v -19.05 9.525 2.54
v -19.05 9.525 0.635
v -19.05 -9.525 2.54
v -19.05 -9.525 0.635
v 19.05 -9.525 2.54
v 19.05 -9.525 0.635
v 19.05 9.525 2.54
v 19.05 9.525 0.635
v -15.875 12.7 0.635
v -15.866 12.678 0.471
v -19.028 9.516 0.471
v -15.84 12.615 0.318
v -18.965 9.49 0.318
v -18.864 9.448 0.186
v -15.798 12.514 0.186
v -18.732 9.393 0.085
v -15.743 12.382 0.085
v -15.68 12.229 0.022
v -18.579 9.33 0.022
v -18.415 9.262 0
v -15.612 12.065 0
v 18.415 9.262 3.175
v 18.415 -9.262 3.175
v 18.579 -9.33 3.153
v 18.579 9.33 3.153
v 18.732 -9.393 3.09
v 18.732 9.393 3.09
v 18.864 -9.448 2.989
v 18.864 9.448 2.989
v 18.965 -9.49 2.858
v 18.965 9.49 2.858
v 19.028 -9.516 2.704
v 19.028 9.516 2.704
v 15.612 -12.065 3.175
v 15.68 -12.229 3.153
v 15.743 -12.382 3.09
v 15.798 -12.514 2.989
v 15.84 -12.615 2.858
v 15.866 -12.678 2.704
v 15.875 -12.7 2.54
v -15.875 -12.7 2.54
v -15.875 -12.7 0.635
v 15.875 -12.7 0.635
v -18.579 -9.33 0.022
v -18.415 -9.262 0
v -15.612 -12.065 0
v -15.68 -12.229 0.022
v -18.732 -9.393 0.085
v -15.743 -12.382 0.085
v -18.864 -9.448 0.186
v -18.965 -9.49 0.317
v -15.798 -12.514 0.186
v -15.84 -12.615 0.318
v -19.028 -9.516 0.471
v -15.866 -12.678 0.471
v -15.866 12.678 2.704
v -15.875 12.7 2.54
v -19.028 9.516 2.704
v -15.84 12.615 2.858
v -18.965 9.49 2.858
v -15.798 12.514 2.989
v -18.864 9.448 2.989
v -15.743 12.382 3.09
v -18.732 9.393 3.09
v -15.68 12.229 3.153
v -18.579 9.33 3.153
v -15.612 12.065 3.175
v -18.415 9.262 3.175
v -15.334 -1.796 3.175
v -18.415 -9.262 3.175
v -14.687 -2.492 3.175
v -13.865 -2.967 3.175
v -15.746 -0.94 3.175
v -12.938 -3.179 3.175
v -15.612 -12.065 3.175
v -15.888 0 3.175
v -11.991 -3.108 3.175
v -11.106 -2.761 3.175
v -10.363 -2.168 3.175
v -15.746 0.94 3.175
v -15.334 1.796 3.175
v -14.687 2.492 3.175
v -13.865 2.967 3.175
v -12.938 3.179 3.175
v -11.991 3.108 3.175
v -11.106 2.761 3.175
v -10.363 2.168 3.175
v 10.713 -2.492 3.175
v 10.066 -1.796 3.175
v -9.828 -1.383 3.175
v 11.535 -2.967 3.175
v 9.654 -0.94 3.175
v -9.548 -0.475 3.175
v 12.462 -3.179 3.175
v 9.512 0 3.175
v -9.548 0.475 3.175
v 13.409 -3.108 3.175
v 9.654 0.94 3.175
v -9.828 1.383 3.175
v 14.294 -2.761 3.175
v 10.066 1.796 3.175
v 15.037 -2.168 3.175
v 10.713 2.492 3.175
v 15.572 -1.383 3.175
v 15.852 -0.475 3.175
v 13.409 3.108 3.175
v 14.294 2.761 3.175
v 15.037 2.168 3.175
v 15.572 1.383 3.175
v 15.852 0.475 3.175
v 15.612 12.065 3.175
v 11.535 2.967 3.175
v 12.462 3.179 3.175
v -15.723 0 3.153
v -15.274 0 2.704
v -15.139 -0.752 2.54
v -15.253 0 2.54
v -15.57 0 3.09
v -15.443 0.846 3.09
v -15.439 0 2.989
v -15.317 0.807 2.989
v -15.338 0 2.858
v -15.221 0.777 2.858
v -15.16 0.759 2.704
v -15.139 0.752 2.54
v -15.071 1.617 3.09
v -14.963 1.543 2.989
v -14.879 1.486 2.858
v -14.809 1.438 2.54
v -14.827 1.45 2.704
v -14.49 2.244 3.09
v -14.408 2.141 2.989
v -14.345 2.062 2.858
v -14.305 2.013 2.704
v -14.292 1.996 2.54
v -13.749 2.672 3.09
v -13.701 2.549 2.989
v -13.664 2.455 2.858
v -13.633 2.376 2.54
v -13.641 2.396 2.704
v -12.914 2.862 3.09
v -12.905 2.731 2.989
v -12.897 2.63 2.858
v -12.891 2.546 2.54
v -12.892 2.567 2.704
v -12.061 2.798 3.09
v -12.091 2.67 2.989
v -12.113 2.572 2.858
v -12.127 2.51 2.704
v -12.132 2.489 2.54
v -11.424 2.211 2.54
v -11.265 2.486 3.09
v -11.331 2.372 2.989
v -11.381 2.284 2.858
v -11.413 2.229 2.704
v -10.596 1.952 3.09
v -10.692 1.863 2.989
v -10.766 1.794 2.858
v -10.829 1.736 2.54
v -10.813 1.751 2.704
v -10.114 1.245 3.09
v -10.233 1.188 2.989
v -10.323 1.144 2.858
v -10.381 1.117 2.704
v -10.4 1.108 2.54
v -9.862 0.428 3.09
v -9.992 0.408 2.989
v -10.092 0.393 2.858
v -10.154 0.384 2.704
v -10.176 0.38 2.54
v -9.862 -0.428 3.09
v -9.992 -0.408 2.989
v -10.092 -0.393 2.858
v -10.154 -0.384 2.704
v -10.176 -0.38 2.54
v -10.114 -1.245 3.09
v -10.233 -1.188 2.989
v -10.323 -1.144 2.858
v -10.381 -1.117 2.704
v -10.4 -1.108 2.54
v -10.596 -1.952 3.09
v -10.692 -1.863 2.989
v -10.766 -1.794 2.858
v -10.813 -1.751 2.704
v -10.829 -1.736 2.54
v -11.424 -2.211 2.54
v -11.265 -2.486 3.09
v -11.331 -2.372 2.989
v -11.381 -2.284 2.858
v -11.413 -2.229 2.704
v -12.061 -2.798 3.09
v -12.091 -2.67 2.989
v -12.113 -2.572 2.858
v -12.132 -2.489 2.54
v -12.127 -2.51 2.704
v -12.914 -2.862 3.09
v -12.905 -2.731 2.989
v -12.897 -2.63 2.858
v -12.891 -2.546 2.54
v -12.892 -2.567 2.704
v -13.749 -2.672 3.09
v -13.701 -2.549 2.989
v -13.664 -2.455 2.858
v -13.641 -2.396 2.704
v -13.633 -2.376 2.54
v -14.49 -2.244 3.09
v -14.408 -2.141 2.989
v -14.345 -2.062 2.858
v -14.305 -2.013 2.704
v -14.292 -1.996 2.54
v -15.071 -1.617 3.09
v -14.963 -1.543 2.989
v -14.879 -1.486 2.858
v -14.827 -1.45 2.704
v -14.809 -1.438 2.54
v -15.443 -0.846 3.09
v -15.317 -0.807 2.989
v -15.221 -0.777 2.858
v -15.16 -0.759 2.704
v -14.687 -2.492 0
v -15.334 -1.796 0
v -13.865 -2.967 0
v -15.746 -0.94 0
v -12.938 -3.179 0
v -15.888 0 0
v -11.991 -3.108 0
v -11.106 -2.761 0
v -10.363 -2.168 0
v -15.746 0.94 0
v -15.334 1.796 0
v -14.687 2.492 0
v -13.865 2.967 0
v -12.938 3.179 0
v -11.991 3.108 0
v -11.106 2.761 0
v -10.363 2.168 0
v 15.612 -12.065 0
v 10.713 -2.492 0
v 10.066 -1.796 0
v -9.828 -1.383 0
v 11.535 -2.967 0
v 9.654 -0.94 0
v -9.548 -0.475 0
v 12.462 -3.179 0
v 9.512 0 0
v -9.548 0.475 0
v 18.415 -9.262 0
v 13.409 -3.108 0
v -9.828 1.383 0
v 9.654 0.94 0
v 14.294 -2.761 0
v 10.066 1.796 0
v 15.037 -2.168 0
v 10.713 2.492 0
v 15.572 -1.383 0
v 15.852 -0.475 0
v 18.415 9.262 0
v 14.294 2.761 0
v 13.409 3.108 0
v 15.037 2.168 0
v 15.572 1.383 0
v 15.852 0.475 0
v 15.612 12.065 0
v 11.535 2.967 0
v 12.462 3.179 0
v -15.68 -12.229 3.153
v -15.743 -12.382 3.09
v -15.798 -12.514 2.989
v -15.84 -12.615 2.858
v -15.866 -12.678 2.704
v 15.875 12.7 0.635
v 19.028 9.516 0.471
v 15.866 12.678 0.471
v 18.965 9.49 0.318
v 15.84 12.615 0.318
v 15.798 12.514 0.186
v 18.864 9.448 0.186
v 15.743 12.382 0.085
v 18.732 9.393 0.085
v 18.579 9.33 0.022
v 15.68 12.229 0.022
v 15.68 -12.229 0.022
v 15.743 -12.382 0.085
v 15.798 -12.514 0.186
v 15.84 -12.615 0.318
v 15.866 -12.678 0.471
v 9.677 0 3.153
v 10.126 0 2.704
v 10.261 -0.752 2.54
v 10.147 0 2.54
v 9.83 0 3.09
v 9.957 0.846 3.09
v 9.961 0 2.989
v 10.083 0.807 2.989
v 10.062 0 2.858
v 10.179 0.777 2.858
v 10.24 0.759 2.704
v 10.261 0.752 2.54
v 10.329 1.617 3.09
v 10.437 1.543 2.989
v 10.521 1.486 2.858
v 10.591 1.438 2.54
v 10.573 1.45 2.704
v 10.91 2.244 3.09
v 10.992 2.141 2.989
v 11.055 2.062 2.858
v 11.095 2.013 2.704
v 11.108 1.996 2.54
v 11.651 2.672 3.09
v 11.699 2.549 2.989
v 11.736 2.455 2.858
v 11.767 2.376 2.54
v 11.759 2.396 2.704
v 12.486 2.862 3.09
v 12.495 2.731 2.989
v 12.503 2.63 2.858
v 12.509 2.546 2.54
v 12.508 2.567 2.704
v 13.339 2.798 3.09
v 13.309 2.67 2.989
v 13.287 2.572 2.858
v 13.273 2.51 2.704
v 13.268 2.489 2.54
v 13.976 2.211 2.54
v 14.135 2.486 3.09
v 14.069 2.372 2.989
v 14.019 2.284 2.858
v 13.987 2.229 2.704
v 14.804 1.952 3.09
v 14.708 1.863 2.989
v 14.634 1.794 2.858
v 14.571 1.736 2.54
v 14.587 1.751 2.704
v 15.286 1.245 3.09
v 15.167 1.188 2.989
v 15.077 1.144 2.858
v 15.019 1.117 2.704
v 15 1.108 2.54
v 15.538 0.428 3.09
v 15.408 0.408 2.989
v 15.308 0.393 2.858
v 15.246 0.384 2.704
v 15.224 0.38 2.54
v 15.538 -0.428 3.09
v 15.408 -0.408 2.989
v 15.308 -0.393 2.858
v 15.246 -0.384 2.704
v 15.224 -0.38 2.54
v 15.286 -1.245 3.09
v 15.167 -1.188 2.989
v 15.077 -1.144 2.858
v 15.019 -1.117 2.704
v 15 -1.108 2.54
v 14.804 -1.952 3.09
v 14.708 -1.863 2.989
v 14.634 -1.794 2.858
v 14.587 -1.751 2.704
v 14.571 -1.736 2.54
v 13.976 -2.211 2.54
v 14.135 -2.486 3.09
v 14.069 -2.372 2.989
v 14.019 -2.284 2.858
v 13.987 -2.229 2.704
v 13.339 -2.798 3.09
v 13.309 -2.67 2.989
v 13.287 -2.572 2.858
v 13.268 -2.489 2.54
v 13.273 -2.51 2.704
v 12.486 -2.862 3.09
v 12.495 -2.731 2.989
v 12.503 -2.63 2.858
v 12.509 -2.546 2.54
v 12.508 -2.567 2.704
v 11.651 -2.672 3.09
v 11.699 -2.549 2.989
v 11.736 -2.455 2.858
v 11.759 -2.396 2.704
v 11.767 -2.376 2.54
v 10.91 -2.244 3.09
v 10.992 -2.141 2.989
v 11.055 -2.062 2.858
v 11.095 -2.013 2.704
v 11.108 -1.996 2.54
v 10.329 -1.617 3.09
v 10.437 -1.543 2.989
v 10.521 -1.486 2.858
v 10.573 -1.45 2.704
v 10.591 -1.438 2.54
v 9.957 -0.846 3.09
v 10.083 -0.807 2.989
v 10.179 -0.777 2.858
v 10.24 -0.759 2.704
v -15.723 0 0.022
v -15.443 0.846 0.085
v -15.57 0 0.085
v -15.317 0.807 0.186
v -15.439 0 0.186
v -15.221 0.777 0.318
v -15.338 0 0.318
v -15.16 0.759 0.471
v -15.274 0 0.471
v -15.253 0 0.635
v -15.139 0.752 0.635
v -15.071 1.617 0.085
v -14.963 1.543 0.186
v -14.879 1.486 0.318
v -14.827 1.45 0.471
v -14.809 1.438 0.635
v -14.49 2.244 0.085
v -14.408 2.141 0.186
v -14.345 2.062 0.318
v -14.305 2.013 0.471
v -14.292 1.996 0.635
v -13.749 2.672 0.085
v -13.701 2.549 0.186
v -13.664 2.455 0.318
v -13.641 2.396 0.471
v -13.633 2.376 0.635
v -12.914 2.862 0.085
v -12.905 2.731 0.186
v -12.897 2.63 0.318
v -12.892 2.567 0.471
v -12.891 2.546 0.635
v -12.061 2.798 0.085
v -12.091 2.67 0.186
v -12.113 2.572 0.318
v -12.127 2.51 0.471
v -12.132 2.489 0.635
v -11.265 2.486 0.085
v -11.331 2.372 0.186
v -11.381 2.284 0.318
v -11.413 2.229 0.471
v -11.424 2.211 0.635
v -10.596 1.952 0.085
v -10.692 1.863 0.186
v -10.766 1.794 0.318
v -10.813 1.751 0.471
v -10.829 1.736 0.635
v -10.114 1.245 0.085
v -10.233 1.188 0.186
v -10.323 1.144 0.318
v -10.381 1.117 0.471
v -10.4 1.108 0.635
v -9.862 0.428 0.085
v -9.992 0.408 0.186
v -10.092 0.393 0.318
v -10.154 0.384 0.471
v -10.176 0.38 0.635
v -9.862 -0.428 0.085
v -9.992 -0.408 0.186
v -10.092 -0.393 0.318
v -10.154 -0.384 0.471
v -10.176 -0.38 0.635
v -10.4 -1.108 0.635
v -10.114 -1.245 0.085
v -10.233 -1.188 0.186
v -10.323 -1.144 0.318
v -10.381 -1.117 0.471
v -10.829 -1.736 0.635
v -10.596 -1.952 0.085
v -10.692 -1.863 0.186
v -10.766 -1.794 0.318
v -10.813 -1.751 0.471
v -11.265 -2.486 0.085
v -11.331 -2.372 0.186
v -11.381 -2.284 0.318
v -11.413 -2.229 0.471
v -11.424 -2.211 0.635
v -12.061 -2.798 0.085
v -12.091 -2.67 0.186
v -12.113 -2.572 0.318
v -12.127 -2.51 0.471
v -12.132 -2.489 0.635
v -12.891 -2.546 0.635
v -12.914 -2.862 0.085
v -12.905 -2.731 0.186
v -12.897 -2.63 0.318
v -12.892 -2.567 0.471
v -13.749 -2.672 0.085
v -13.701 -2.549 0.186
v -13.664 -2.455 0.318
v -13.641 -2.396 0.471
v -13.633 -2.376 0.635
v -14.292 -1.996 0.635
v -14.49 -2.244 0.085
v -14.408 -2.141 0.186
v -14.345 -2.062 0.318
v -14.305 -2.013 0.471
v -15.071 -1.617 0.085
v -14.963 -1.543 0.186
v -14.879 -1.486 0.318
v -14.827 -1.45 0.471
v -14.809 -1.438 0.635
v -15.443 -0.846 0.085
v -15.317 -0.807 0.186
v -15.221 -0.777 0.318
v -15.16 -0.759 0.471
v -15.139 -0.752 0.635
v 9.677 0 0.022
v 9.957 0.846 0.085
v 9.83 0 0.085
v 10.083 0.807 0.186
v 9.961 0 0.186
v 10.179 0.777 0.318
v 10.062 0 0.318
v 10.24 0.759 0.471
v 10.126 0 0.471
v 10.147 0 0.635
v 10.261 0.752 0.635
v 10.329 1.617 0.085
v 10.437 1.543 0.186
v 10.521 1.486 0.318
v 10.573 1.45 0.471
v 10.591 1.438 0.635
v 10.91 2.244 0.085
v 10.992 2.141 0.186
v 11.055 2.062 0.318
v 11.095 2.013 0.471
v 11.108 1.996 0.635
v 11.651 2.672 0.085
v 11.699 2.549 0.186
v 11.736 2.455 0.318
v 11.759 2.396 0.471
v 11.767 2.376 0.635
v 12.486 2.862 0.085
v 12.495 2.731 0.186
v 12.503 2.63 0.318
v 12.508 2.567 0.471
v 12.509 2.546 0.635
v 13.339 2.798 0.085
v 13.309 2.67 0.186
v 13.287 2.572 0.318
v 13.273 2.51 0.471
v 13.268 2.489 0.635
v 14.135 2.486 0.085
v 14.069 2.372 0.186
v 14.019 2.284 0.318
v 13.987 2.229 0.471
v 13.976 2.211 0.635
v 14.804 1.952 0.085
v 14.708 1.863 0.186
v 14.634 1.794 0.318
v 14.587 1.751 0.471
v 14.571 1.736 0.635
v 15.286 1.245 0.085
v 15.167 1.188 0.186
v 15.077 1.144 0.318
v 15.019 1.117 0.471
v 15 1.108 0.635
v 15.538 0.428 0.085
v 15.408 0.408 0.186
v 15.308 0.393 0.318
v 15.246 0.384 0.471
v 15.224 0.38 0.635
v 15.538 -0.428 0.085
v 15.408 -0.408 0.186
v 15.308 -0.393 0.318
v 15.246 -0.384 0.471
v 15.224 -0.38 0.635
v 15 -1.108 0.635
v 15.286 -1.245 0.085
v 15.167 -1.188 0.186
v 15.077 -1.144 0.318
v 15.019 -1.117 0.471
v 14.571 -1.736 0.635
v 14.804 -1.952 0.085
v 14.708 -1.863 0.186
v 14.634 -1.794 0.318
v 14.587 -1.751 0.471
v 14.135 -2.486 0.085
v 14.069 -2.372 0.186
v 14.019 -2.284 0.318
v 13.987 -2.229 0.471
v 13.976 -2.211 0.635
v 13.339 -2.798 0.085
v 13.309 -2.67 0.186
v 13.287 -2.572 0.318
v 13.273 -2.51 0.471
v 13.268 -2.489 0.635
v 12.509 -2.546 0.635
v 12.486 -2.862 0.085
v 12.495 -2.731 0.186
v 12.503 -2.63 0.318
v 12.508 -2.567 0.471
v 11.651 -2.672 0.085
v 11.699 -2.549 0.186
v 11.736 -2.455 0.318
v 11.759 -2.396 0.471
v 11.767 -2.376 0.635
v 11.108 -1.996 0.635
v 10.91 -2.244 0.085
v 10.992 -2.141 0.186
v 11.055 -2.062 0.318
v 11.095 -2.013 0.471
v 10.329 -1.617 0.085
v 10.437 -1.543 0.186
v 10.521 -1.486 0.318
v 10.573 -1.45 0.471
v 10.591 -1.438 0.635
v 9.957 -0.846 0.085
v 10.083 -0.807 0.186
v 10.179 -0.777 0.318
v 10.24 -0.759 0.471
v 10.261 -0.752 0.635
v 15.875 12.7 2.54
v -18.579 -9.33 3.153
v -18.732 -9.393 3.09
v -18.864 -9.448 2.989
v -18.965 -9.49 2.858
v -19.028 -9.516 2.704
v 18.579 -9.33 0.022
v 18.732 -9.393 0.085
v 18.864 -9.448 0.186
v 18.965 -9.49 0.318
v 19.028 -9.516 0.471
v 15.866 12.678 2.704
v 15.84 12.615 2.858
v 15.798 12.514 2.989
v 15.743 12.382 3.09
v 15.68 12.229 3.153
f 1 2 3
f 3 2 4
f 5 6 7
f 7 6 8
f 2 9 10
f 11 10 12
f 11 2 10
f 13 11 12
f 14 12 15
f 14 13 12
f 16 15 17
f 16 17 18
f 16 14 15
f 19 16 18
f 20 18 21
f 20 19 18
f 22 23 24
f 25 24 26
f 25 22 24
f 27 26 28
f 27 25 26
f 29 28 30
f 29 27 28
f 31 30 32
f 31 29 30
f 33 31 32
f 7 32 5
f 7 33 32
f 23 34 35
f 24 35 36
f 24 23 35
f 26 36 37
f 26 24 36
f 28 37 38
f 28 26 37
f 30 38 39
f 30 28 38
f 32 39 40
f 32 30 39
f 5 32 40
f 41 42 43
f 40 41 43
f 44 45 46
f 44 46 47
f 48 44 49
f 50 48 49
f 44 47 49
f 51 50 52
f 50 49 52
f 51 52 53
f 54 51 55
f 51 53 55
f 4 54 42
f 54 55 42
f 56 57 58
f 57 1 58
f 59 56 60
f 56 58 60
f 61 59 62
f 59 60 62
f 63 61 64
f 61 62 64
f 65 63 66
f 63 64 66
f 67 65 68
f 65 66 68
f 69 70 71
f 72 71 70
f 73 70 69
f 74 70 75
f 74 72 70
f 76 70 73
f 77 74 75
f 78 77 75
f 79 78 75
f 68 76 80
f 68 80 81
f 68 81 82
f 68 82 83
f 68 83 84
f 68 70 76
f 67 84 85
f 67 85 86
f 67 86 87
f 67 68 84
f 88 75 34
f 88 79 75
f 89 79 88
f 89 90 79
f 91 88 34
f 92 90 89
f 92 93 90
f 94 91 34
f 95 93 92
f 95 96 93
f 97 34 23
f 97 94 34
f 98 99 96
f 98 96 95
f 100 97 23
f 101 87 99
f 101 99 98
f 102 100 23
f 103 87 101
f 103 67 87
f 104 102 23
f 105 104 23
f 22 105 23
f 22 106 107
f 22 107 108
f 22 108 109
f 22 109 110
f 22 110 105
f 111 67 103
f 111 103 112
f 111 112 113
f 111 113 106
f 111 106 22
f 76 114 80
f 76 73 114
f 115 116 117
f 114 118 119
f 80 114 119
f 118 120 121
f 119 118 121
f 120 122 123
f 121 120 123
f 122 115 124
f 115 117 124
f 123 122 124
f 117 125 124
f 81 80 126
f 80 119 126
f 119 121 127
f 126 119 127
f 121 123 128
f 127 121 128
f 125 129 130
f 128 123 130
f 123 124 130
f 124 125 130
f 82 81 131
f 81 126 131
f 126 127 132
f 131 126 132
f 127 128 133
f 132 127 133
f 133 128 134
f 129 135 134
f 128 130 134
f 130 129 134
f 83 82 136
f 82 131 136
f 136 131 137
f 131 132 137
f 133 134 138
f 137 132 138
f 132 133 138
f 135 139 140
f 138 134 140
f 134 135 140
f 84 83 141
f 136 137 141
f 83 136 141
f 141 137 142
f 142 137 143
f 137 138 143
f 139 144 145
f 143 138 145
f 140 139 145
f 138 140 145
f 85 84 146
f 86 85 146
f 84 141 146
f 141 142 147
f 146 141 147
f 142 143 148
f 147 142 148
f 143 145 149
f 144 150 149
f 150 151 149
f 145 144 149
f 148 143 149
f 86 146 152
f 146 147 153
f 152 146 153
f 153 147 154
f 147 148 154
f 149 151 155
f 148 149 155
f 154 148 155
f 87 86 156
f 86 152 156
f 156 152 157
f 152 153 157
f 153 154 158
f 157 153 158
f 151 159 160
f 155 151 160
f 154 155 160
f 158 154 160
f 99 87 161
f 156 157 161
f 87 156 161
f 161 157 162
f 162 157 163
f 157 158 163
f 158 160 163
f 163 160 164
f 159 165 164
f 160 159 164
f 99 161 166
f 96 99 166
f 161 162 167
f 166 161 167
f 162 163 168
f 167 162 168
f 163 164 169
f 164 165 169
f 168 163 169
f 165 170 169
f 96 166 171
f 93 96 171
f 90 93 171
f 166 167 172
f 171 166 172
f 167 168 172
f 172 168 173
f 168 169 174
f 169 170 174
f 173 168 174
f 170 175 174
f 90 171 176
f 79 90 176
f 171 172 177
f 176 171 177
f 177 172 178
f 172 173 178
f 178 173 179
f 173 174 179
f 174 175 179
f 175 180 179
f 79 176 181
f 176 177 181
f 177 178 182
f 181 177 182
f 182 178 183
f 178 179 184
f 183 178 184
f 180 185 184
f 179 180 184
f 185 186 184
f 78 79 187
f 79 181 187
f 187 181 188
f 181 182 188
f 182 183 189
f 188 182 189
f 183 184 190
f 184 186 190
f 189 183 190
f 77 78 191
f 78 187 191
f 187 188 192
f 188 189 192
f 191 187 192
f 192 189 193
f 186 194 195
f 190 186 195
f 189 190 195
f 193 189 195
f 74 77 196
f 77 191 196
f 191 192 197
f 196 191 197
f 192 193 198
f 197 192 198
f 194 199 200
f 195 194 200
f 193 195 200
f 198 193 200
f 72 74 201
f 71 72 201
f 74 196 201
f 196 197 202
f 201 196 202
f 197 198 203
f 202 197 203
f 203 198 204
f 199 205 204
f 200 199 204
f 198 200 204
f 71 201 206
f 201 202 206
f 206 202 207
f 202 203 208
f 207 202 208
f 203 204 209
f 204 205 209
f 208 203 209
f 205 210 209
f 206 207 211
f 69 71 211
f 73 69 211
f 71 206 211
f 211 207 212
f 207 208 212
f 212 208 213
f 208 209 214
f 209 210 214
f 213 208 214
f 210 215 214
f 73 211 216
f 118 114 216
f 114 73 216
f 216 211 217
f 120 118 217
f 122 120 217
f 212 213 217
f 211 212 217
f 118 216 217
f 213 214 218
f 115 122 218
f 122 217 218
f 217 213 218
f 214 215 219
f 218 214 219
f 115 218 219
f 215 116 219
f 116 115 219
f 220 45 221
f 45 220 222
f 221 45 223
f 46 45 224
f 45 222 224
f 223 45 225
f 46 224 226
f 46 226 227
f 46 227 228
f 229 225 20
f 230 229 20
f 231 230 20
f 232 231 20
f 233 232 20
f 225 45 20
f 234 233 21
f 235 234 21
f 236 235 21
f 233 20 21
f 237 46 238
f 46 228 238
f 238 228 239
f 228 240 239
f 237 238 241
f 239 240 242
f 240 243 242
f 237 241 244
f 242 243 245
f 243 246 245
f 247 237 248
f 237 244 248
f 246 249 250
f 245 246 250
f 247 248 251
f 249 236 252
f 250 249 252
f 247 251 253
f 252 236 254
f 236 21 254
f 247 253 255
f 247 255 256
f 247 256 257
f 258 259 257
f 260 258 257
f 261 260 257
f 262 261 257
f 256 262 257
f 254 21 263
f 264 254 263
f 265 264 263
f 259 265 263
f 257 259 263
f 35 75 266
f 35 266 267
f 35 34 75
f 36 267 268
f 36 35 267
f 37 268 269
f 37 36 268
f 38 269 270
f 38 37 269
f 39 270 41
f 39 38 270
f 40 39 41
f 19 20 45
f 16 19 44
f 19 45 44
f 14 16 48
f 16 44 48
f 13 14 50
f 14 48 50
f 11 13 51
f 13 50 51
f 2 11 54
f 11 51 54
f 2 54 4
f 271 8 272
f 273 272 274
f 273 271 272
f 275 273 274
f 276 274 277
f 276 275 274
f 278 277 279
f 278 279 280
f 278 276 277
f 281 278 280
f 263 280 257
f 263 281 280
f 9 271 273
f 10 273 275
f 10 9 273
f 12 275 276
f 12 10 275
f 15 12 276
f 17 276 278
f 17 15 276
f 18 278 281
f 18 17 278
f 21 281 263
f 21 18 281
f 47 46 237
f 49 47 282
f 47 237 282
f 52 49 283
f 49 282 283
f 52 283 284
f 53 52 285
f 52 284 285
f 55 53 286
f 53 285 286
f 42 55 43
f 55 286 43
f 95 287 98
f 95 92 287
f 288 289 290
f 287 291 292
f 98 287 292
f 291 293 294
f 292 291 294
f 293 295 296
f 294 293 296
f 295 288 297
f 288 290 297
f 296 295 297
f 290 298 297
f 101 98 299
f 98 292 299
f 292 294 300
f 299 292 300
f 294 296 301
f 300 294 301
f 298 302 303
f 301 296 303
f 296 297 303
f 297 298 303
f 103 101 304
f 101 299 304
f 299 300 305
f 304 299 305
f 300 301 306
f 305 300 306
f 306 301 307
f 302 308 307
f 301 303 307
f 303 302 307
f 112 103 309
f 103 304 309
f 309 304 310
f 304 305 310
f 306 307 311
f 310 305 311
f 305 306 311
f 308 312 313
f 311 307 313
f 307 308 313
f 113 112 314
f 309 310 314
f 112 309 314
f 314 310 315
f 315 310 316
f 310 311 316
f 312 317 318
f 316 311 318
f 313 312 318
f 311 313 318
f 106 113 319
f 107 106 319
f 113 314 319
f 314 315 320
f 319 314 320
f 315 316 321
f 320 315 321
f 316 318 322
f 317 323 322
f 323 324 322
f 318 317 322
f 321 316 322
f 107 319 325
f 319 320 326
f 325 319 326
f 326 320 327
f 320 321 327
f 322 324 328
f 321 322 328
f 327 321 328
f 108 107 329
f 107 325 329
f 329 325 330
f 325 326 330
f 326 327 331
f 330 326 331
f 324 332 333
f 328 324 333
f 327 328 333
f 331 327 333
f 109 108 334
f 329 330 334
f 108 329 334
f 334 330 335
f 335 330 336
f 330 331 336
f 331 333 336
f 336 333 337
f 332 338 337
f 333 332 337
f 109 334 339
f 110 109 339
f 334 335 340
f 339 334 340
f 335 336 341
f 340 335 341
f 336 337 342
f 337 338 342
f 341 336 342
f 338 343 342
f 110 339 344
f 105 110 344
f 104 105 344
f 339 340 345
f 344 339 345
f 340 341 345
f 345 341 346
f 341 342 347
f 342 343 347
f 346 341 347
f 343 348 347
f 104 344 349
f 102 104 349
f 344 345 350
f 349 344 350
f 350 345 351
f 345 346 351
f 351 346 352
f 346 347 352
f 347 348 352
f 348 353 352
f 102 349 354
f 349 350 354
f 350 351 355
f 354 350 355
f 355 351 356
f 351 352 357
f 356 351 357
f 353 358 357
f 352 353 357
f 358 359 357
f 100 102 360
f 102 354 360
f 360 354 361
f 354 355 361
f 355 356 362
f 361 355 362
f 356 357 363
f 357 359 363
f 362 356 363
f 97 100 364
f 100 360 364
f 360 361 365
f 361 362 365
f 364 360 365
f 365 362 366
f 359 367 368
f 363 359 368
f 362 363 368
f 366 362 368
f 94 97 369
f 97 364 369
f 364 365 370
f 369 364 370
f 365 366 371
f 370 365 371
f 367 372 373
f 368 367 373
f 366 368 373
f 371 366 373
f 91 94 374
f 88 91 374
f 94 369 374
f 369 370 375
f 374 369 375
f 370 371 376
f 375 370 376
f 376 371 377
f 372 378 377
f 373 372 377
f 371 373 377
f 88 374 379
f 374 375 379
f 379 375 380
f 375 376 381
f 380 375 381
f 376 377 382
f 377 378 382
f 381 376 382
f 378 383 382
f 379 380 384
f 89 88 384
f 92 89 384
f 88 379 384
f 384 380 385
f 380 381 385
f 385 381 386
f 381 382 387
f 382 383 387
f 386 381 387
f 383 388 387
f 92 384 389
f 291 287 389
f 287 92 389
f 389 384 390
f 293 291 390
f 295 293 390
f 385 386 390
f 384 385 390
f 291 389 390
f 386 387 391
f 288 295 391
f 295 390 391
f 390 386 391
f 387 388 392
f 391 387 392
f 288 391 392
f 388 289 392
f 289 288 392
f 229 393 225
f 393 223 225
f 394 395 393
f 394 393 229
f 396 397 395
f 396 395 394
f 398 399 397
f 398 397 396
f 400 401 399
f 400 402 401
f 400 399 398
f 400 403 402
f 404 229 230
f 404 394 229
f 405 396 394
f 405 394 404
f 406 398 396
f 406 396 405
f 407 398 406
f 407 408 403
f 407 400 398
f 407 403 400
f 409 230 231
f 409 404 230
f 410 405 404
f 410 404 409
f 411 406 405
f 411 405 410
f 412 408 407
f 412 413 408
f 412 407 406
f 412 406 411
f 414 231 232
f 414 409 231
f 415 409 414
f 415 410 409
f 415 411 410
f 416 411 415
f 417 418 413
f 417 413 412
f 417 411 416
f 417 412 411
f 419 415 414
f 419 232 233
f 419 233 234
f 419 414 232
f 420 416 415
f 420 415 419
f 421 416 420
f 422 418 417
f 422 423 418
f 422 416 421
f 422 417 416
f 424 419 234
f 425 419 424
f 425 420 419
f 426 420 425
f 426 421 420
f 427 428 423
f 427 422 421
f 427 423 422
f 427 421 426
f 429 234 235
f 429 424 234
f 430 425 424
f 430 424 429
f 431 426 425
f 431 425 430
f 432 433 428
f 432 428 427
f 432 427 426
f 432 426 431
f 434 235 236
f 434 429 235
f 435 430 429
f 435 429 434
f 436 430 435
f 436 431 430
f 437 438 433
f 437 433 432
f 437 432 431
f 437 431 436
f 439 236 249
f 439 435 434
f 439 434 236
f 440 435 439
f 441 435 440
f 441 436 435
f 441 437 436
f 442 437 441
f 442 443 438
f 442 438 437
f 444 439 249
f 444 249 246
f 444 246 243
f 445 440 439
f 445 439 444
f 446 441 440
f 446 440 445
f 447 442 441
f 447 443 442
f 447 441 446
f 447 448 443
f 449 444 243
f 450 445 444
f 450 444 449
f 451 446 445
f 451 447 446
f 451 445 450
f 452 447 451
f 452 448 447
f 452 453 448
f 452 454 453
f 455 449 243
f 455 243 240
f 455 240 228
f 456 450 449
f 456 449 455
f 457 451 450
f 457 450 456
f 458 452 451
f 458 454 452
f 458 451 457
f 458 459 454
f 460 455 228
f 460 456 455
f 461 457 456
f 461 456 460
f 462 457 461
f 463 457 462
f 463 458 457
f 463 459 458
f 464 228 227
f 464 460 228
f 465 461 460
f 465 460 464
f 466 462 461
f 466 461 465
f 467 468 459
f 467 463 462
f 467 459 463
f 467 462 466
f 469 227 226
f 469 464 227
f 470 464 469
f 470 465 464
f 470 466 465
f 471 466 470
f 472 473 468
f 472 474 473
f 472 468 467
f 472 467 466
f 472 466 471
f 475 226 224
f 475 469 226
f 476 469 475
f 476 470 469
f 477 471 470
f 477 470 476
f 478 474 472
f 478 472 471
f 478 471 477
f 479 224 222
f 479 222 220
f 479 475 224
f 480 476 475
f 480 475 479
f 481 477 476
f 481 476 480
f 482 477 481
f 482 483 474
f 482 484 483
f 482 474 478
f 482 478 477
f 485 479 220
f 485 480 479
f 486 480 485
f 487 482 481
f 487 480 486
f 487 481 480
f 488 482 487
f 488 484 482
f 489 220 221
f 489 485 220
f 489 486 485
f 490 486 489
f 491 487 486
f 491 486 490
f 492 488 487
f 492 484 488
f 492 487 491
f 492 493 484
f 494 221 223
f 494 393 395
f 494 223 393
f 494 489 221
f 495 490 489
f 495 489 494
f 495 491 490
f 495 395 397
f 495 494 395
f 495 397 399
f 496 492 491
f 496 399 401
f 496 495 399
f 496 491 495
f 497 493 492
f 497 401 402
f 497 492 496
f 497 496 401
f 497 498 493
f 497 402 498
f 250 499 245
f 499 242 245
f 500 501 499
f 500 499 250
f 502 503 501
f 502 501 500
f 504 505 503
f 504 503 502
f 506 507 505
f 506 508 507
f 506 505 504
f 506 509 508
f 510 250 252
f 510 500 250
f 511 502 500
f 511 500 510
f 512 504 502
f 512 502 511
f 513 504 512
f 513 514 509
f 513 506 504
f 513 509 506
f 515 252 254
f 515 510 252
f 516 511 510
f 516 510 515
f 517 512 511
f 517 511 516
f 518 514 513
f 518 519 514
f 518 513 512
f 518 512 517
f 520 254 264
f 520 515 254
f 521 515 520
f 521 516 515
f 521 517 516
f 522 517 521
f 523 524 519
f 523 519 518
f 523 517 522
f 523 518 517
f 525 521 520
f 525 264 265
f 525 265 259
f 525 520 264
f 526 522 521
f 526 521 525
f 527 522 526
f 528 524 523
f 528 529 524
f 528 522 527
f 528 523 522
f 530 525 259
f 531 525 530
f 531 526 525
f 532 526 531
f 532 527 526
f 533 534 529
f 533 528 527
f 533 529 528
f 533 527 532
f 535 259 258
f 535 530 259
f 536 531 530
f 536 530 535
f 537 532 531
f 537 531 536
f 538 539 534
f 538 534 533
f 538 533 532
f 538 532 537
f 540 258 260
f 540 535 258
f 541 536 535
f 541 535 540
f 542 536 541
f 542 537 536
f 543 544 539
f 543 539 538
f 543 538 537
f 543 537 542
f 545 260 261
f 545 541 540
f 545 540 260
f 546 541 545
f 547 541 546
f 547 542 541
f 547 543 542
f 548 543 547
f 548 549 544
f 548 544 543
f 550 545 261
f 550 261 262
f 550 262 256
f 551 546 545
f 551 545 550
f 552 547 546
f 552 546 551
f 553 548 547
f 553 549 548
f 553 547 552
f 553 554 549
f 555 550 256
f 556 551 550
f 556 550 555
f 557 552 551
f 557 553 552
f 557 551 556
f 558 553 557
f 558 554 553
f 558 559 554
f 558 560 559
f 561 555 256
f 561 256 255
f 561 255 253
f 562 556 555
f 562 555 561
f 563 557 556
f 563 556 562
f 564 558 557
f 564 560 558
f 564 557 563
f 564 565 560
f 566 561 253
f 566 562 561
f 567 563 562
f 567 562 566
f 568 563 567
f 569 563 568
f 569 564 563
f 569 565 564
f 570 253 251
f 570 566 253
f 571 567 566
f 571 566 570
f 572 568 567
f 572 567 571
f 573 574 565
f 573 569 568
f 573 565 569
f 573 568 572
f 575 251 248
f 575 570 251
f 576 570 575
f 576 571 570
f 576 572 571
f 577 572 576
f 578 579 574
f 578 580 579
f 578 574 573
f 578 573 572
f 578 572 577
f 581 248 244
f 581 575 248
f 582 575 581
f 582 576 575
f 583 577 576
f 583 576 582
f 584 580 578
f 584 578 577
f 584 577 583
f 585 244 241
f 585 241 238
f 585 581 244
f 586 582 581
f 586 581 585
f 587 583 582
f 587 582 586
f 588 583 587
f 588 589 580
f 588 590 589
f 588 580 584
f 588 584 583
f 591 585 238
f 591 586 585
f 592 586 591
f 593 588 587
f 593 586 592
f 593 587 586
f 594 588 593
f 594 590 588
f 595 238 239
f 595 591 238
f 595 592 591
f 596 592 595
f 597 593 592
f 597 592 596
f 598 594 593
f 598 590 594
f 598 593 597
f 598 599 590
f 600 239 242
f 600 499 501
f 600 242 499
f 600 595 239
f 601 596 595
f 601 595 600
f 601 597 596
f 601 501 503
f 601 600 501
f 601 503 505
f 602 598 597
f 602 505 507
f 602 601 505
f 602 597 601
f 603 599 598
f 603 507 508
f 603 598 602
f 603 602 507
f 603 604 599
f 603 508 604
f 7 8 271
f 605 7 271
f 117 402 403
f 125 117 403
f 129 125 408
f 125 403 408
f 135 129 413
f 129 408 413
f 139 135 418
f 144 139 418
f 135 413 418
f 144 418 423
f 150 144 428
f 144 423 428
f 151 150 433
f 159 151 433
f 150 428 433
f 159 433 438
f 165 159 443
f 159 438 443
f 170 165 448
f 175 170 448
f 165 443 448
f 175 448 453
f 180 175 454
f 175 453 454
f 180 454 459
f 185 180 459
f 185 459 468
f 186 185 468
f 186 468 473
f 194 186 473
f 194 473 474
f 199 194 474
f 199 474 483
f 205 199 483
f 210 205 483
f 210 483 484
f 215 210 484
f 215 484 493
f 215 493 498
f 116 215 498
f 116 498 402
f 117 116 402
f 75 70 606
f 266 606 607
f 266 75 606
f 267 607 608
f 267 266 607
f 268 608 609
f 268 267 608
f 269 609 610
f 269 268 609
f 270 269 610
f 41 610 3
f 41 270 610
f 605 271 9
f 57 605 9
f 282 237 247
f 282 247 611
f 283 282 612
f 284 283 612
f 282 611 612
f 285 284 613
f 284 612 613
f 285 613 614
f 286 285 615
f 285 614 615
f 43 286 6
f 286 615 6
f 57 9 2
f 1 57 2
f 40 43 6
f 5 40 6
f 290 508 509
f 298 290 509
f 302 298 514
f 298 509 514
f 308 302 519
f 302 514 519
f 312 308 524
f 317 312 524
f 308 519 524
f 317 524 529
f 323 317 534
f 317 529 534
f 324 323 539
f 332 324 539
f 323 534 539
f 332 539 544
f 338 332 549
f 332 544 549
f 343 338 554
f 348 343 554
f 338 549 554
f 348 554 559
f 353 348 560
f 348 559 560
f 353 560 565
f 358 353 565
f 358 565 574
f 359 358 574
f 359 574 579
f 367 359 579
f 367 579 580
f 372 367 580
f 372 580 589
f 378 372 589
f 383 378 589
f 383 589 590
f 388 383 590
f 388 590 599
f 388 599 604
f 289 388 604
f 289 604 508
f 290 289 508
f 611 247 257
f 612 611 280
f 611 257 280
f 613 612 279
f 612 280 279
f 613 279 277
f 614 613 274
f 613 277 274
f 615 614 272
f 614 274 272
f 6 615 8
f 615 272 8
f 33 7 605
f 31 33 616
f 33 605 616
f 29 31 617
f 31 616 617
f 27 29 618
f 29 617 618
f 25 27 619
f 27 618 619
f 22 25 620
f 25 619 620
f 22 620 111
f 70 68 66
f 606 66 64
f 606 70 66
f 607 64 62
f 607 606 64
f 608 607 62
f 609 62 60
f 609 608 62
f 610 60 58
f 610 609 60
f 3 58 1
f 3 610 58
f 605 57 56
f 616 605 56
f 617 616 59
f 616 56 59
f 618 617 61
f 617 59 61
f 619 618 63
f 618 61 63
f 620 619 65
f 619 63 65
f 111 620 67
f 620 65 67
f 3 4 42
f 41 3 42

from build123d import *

# Parameters (mm, degrees)
BOSS_EXTRUDE1_DEPTH    = 3.175
F_10_CLEARANCE_HOLE1_D = 5.1054
FILLET1_R              = 0.635


with BuildPart() as part:
    # Sketch1 → Boss-Extrude1 (new body)
    with BuildSketch(Plane.XY):
        Polygon((15.875, 12.7), (-15.875, 12.7), (-19.05, 9.525), (-19.05, -9.525), (-15.875, -12.7), (15.875, -12.7), (19.05, -9.525), (19.05, 9.525), align=None)
    extrude(amount=BOSS_EXTRUDE1_DEPTH)

    # #10 Clearance Hole1 (through all)
    with Locations(Plane.XY.offset(3.175)):
        with Locations((12.7, 0), (-12.7, 0)):
            Hole(F_10_CLEARANCE_HOLE1_D / 2)

    # Fillet1
    fillet1_edges = [part.edges().sort_by_distance(p)[0] for p in [
        (-17.4625, -11.1125, 3.175),
        (-19.05, 0, 0),
        (-17.4625, 11.1125, 0),
        (0, -12.7, 3.175),
        (17.4625, -11.1125, 3.175),
        (19.05, 0, 3.175),
        (17.4625, 11.1125, 3.175),
        (0, 12.7, 3.175),
        (-10.1473, 0, 3.175),
        (-10.1473, 0, 0),
        (15.2527, 0, 3.175),
        (15.2527, 0, 0),
        (-17.4625, 11.1125, 3.175),
        (-19.05, 0, 3.175),
        (0, 12.7, 0),
        (17.4625, 11.1125, 0),
        (19.05, 0, 0),
        (17.4625, -11.1125, 0),
        (0, -12.7, 0),
        (-17.4625, -11.1125, 0),
    ]]
    fillet(fillet1_edges, radius=FILLET1_R)


solid = part.part
